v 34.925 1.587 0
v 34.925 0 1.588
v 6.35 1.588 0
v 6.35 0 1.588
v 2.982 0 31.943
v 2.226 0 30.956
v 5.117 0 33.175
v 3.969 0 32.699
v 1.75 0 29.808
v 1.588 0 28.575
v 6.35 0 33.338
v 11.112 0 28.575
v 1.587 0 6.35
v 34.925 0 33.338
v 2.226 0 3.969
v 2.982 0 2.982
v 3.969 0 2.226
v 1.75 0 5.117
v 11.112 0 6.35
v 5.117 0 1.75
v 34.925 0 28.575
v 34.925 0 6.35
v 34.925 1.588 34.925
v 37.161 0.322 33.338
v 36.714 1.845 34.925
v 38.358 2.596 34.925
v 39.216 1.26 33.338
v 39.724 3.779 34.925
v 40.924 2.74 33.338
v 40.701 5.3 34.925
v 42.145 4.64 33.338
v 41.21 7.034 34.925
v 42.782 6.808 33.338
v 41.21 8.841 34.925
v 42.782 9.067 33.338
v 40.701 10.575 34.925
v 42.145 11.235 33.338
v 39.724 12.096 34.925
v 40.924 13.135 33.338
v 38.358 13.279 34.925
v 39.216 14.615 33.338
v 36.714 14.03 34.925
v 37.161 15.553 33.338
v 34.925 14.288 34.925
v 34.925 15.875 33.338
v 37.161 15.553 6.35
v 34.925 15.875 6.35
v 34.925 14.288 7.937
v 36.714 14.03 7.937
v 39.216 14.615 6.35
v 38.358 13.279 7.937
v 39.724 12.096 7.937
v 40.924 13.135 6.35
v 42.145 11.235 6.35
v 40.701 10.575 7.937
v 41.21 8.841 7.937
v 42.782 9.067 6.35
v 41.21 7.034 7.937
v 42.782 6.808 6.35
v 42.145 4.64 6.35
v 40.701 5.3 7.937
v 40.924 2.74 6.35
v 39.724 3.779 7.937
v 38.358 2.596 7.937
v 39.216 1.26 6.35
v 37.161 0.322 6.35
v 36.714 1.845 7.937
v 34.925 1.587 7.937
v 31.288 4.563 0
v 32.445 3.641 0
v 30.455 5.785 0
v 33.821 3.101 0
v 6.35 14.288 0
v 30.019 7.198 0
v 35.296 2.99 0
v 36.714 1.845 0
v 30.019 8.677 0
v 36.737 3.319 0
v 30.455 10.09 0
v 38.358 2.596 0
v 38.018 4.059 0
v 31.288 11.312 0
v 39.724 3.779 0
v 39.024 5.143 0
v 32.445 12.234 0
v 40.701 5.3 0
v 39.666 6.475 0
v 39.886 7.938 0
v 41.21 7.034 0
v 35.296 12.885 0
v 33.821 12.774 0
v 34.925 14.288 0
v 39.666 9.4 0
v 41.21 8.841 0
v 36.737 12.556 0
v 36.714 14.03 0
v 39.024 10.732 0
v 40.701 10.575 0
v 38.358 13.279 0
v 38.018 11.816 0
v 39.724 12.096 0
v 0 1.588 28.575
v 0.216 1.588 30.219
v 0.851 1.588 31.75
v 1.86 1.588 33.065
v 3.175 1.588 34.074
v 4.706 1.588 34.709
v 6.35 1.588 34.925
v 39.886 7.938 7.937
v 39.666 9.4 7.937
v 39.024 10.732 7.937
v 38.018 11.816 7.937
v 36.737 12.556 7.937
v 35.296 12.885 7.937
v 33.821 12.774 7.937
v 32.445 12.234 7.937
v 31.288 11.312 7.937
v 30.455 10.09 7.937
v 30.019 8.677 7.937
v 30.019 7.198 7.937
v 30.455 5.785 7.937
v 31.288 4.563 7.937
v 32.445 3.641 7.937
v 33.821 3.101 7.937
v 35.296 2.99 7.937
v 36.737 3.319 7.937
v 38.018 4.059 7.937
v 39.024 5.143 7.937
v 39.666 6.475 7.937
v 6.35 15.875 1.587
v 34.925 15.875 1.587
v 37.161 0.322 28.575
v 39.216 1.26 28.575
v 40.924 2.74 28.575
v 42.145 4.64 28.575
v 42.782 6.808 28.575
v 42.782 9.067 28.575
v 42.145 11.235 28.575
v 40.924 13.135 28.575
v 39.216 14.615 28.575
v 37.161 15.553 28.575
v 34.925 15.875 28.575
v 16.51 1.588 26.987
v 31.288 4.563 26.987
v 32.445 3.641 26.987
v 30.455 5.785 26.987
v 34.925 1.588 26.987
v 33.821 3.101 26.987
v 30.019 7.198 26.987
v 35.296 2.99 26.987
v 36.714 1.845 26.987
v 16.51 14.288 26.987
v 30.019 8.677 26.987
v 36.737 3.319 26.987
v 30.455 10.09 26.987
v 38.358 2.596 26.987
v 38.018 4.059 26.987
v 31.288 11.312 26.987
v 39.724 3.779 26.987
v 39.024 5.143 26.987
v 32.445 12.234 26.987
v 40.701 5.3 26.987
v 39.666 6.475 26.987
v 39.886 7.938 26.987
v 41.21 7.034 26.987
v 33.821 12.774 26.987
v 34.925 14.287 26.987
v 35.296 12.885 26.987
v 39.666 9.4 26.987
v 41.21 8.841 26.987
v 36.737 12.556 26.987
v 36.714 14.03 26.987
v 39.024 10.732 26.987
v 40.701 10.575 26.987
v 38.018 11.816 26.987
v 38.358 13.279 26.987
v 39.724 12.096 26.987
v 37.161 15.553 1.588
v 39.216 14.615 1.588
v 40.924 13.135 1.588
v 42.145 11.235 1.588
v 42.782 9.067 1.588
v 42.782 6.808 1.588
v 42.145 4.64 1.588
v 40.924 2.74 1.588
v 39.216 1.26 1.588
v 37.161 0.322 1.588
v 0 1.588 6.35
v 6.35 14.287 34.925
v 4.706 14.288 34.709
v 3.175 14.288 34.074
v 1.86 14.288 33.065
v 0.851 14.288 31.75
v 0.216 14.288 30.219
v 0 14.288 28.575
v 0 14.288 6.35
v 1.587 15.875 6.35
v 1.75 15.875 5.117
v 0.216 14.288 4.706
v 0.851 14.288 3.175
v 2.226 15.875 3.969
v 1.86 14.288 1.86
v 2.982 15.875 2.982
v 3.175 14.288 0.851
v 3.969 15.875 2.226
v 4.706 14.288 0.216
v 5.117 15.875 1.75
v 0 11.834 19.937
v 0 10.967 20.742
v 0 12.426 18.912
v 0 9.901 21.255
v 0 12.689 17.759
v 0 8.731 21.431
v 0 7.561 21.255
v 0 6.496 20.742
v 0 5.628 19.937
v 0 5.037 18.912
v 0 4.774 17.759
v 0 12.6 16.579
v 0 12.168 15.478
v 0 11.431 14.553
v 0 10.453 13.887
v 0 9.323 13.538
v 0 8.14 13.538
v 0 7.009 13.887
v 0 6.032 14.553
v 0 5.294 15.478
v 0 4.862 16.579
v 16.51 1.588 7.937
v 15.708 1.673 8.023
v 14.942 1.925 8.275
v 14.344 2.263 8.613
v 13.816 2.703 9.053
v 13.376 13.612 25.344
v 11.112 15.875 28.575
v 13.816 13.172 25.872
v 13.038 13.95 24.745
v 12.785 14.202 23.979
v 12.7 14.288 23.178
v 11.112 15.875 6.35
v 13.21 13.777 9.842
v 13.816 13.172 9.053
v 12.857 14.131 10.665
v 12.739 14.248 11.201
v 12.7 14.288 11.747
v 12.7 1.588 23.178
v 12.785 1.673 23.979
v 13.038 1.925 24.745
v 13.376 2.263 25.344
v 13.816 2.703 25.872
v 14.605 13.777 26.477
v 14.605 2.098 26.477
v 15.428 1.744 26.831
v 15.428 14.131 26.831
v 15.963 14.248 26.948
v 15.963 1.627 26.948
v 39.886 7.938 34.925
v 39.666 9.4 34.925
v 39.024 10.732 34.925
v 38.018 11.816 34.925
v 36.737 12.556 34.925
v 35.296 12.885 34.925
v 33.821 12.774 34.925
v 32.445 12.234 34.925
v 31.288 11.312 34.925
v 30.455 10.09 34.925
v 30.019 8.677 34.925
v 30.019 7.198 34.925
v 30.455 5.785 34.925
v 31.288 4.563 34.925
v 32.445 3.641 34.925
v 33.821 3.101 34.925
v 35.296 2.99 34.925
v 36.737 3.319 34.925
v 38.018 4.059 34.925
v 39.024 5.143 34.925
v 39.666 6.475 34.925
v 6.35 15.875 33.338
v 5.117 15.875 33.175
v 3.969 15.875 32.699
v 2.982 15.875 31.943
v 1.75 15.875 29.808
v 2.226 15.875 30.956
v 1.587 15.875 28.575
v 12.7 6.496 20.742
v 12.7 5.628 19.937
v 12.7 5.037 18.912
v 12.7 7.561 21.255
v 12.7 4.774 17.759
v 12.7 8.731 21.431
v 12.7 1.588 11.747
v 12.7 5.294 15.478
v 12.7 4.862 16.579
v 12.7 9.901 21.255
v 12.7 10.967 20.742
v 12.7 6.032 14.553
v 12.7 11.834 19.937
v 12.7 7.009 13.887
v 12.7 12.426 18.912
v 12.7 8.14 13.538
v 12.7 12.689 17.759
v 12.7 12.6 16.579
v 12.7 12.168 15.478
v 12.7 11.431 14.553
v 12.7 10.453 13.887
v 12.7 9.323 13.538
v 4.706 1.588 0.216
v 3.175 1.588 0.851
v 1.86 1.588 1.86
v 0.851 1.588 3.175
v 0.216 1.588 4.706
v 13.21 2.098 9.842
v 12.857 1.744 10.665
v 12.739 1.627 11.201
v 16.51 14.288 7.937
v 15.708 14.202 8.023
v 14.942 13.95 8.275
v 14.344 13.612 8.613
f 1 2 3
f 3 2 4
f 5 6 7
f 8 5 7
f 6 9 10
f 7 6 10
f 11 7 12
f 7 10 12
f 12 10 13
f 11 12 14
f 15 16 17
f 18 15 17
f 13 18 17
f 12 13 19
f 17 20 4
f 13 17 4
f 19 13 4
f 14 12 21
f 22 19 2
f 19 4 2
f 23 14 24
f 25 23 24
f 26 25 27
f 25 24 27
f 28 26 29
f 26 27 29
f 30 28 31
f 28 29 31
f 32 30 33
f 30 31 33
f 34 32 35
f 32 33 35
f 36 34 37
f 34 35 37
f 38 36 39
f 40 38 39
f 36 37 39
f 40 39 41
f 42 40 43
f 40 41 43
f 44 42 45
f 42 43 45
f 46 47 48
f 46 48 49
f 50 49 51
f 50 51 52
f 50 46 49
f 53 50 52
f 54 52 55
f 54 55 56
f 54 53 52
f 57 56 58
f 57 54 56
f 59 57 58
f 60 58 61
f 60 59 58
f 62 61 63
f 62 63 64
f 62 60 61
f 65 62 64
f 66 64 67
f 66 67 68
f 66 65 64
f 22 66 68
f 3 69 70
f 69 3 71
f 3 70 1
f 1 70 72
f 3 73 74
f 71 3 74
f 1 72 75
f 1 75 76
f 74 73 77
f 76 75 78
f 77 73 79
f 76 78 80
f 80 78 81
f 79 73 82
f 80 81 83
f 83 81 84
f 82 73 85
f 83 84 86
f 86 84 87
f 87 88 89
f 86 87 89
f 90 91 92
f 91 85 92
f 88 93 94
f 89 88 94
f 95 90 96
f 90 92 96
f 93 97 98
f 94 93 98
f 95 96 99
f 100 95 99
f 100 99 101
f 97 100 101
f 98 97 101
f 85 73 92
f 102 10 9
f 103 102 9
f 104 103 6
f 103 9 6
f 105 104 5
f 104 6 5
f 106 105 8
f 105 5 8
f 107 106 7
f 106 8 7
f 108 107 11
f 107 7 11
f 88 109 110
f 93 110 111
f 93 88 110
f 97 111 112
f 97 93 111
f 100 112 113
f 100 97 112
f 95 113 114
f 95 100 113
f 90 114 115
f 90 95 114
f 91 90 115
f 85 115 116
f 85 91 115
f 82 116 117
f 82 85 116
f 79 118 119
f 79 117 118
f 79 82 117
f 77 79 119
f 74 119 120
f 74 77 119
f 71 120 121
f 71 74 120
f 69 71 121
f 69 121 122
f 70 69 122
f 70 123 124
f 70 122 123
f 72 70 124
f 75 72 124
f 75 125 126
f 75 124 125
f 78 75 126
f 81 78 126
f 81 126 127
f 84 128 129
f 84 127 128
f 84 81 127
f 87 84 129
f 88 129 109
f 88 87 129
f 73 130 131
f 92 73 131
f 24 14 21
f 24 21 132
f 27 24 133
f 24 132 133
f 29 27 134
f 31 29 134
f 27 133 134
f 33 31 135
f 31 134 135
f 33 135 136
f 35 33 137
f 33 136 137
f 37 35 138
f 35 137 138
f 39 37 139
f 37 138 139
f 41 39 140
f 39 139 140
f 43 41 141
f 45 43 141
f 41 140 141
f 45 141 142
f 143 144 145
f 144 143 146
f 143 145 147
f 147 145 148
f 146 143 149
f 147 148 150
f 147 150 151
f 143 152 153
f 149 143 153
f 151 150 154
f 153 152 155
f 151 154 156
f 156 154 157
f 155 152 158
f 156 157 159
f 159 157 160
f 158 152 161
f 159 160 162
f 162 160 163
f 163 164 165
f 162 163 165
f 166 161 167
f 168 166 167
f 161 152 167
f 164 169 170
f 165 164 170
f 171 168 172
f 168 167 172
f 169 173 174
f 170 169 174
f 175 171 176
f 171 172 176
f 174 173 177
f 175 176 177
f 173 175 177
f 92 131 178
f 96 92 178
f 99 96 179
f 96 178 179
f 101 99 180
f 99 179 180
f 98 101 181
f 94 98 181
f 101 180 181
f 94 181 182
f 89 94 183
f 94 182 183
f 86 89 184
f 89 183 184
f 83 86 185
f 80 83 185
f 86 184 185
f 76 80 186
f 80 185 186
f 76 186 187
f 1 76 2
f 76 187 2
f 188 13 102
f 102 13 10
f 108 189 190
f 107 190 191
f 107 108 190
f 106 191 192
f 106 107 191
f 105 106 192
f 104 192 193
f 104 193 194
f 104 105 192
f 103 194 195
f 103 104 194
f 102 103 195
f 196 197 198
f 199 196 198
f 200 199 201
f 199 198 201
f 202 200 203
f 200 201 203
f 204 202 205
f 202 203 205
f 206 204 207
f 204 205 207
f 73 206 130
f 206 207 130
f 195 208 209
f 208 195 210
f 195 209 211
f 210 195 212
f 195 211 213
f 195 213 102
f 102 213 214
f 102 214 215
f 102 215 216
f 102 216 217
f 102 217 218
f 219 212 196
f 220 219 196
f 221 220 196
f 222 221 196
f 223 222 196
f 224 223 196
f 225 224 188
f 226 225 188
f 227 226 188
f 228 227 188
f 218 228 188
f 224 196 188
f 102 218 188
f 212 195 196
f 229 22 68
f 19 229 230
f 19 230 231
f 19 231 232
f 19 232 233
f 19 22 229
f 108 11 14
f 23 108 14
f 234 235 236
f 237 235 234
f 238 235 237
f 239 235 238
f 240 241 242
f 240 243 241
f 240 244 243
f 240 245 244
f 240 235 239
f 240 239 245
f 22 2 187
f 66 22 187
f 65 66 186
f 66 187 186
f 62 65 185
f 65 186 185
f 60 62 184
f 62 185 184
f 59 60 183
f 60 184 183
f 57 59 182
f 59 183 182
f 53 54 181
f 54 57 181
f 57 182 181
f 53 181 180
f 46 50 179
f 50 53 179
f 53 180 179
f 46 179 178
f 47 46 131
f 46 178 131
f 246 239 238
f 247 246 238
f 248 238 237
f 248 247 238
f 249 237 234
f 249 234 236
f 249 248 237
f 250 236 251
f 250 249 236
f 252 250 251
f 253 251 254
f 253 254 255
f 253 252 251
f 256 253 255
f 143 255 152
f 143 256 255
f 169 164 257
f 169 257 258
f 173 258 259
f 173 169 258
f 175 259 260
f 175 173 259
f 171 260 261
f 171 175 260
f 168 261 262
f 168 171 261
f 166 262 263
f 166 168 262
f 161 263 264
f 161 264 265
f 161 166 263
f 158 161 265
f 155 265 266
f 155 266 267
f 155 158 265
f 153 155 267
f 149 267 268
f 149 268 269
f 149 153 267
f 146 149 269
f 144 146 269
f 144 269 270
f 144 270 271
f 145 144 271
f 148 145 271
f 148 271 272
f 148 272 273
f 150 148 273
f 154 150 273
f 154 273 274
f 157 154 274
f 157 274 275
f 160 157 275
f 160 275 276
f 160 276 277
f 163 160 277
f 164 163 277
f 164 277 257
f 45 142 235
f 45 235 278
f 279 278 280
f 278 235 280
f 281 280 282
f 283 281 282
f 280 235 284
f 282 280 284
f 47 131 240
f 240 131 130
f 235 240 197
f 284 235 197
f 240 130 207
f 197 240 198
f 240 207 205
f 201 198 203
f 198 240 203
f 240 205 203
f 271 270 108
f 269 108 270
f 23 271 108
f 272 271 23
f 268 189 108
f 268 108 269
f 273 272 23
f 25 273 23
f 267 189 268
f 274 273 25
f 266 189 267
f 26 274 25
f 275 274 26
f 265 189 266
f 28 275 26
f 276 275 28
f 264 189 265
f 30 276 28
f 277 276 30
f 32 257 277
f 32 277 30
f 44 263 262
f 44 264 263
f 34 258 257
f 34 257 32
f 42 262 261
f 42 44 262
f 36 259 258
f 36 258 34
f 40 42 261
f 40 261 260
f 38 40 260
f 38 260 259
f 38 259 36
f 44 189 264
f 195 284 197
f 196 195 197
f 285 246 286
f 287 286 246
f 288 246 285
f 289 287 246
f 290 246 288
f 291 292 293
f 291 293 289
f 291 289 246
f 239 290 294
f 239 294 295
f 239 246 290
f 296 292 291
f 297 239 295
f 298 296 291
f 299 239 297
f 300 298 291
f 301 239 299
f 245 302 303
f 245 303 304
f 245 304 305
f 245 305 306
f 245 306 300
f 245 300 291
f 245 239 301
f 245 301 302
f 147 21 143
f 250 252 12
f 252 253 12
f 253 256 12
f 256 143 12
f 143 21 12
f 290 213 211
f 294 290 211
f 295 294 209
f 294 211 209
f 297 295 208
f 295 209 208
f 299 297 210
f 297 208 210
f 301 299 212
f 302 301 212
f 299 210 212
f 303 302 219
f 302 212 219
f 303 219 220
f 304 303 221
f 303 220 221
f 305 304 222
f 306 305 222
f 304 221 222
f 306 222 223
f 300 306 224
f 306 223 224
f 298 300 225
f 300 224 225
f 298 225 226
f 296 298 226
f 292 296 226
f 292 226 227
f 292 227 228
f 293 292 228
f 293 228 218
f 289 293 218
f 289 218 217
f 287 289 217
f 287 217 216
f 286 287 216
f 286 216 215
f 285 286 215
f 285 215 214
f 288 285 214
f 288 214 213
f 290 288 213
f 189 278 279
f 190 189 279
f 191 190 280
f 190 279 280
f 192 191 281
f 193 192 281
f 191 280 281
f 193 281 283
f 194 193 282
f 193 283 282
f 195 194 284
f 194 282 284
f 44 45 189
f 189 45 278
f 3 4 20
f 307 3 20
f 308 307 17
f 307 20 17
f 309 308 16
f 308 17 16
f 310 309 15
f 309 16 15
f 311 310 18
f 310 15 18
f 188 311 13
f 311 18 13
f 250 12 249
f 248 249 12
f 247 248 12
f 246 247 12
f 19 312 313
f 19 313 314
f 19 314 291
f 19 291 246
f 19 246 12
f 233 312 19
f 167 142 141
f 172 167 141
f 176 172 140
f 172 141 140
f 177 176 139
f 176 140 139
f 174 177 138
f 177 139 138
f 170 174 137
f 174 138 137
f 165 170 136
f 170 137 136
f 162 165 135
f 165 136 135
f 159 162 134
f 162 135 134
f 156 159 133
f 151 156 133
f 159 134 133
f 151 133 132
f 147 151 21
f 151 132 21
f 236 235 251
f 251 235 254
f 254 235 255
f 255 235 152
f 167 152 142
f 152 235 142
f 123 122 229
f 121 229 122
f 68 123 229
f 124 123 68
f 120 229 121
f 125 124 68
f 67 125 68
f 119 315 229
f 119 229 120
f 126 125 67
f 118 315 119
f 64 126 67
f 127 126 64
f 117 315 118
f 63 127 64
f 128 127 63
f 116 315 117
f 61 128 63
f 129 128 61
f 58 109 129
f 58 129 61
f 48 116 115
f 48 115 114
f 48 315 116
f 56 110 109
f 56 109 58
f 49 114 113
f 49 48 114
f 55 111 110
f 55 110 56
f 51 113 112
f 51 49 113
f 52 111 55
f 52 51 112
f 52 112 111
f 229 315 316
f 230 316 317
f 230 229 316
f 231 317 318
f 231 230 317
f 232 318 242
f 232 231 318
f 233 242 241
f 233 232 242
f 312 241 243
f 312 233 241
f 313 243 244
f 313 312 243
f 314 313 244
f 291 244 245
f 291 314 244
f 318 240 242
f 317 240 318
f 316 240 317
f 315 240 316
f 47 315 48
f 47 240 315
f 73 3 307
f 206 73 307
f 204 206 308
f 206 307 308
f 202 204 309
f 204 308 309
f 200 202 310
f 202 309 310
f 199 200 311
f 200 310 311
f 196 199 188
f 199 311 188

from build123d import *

# Parameters (mm, degrees)
SKETCH1_R           = 4.9609375
BOSS_EXTRUDE1_DEPTH = 34.925
SKETCH2_W           = 30.1625
SKETCH2_H           = 19.05
CUT_EXTRUDE1_DEPTH  = 16.875
SKETCH3_R           = 3.96875
CUT_EXTRUDE2_DEPTH  = 43.8625
FILLET1_R           = 6.35
CHAMFER1_SIZE       = 1.5875
FILLET2_R           = 3.81


with BuildPart() as part:
    # Sketch1 → Boss-Extrude1 (new body)
    with BuildSketch(Plane.XY):
        with BuildLine():
            Line((0, 0), (34.925, 0))
            ThreePointArc((34.925, 0), (42.8625, 7.9375), (34.925, 15.875))
            Line((34.925, 15.875), (0, 15.875))
            Line((0, 15.875), (0, 0))
        make_face()
        with Locations((34.925, 7.9375)):
            Circle(SKETCH1_R, mode=Mode.SUBTRACT)
    extrude(amount=BOSS_EXTRUDE1_DEPTH)

    # Sketch2 → Cut-Extrude1 (cut, through all)
    with BuildSketch(Plane(origin=(0, 15.875, 0), x_dir=(1, 0, 0), z_dir=(0, 1, 0))):
        with Locations((27.78125, -17.4625)):
            Rectangle(SKETCH2_W, SKETCH2_H)
    extrude(amount=-CUT_EXTRUDE1_DEPTH, mode=Mode.SUBTRACT)

    # Sketch3 → Cut-Extrude2 (cut, through all)
    with BuildSketch(Plane.ZY):
        with Locations((17.4625, 8.73125)):
            Circle(SKETCH3_R)
    extrude(amount=-CUT_EXTRUDE2_DEPTH, mode=Mode.SUBTRACT)

    # Fillet1
    fillet1_edges = [part.edges().sort_by_distance(p)[0] for p in [
        (0, 7.9375, 34.925),
        (0, 7.9375, 0),
    ]]
    fillet(fillet1_edges, radius=FILLET1_R)

    # Chamfer1
    chamfer1_edges = [part.edges().sort_by_distance(p)[0] for p in [
        (42.8625, 7.9375, 34.925),
        (20.6375, 15.875, 34.925),
        (23.8125, 15.875, 26.9875),
        (23.8125, 15.875, 7.9375),
        (12.7, 15.875, 17.4625),
        (42.8625, 7.9375, 7.9375),
        (23.8125, 0, 7.9375),
        (42.8625, 7.9375, 26.9875),
        (23.8125, 0, 26.9875),
        (12.7, 0, 17.4625),
        (20.6375, 15.875, 0),
        (0, 0, 17.4625),
        (0, 15.875, 17.4625),
        (42.8625, 7.9375, 0),
        (20.6375, 0, 34.925),
        (20.6375, 0, 0),
        (1.859871939, 0, 33.065128061),
        (1.859871939, 0, 1.859871939),
        (1.859871939, 15.875, 33.065128061),
        (1.859871939, 15.875, 1.859871939),
    ]]
    chamfer(chamfer1_edges, length=CHAMFER1_SIZE)

    # Fillet2
    fillet2_edges = [part.edges().sort_by_distance(p)[0] for p in [
        (12.7, 7.9375, 26.9875),
        (12.7, 7.9375, 7.9375),
    ]]
    fillet(fillet2_edges, radius=FILLET2_R)


solid = part.part
